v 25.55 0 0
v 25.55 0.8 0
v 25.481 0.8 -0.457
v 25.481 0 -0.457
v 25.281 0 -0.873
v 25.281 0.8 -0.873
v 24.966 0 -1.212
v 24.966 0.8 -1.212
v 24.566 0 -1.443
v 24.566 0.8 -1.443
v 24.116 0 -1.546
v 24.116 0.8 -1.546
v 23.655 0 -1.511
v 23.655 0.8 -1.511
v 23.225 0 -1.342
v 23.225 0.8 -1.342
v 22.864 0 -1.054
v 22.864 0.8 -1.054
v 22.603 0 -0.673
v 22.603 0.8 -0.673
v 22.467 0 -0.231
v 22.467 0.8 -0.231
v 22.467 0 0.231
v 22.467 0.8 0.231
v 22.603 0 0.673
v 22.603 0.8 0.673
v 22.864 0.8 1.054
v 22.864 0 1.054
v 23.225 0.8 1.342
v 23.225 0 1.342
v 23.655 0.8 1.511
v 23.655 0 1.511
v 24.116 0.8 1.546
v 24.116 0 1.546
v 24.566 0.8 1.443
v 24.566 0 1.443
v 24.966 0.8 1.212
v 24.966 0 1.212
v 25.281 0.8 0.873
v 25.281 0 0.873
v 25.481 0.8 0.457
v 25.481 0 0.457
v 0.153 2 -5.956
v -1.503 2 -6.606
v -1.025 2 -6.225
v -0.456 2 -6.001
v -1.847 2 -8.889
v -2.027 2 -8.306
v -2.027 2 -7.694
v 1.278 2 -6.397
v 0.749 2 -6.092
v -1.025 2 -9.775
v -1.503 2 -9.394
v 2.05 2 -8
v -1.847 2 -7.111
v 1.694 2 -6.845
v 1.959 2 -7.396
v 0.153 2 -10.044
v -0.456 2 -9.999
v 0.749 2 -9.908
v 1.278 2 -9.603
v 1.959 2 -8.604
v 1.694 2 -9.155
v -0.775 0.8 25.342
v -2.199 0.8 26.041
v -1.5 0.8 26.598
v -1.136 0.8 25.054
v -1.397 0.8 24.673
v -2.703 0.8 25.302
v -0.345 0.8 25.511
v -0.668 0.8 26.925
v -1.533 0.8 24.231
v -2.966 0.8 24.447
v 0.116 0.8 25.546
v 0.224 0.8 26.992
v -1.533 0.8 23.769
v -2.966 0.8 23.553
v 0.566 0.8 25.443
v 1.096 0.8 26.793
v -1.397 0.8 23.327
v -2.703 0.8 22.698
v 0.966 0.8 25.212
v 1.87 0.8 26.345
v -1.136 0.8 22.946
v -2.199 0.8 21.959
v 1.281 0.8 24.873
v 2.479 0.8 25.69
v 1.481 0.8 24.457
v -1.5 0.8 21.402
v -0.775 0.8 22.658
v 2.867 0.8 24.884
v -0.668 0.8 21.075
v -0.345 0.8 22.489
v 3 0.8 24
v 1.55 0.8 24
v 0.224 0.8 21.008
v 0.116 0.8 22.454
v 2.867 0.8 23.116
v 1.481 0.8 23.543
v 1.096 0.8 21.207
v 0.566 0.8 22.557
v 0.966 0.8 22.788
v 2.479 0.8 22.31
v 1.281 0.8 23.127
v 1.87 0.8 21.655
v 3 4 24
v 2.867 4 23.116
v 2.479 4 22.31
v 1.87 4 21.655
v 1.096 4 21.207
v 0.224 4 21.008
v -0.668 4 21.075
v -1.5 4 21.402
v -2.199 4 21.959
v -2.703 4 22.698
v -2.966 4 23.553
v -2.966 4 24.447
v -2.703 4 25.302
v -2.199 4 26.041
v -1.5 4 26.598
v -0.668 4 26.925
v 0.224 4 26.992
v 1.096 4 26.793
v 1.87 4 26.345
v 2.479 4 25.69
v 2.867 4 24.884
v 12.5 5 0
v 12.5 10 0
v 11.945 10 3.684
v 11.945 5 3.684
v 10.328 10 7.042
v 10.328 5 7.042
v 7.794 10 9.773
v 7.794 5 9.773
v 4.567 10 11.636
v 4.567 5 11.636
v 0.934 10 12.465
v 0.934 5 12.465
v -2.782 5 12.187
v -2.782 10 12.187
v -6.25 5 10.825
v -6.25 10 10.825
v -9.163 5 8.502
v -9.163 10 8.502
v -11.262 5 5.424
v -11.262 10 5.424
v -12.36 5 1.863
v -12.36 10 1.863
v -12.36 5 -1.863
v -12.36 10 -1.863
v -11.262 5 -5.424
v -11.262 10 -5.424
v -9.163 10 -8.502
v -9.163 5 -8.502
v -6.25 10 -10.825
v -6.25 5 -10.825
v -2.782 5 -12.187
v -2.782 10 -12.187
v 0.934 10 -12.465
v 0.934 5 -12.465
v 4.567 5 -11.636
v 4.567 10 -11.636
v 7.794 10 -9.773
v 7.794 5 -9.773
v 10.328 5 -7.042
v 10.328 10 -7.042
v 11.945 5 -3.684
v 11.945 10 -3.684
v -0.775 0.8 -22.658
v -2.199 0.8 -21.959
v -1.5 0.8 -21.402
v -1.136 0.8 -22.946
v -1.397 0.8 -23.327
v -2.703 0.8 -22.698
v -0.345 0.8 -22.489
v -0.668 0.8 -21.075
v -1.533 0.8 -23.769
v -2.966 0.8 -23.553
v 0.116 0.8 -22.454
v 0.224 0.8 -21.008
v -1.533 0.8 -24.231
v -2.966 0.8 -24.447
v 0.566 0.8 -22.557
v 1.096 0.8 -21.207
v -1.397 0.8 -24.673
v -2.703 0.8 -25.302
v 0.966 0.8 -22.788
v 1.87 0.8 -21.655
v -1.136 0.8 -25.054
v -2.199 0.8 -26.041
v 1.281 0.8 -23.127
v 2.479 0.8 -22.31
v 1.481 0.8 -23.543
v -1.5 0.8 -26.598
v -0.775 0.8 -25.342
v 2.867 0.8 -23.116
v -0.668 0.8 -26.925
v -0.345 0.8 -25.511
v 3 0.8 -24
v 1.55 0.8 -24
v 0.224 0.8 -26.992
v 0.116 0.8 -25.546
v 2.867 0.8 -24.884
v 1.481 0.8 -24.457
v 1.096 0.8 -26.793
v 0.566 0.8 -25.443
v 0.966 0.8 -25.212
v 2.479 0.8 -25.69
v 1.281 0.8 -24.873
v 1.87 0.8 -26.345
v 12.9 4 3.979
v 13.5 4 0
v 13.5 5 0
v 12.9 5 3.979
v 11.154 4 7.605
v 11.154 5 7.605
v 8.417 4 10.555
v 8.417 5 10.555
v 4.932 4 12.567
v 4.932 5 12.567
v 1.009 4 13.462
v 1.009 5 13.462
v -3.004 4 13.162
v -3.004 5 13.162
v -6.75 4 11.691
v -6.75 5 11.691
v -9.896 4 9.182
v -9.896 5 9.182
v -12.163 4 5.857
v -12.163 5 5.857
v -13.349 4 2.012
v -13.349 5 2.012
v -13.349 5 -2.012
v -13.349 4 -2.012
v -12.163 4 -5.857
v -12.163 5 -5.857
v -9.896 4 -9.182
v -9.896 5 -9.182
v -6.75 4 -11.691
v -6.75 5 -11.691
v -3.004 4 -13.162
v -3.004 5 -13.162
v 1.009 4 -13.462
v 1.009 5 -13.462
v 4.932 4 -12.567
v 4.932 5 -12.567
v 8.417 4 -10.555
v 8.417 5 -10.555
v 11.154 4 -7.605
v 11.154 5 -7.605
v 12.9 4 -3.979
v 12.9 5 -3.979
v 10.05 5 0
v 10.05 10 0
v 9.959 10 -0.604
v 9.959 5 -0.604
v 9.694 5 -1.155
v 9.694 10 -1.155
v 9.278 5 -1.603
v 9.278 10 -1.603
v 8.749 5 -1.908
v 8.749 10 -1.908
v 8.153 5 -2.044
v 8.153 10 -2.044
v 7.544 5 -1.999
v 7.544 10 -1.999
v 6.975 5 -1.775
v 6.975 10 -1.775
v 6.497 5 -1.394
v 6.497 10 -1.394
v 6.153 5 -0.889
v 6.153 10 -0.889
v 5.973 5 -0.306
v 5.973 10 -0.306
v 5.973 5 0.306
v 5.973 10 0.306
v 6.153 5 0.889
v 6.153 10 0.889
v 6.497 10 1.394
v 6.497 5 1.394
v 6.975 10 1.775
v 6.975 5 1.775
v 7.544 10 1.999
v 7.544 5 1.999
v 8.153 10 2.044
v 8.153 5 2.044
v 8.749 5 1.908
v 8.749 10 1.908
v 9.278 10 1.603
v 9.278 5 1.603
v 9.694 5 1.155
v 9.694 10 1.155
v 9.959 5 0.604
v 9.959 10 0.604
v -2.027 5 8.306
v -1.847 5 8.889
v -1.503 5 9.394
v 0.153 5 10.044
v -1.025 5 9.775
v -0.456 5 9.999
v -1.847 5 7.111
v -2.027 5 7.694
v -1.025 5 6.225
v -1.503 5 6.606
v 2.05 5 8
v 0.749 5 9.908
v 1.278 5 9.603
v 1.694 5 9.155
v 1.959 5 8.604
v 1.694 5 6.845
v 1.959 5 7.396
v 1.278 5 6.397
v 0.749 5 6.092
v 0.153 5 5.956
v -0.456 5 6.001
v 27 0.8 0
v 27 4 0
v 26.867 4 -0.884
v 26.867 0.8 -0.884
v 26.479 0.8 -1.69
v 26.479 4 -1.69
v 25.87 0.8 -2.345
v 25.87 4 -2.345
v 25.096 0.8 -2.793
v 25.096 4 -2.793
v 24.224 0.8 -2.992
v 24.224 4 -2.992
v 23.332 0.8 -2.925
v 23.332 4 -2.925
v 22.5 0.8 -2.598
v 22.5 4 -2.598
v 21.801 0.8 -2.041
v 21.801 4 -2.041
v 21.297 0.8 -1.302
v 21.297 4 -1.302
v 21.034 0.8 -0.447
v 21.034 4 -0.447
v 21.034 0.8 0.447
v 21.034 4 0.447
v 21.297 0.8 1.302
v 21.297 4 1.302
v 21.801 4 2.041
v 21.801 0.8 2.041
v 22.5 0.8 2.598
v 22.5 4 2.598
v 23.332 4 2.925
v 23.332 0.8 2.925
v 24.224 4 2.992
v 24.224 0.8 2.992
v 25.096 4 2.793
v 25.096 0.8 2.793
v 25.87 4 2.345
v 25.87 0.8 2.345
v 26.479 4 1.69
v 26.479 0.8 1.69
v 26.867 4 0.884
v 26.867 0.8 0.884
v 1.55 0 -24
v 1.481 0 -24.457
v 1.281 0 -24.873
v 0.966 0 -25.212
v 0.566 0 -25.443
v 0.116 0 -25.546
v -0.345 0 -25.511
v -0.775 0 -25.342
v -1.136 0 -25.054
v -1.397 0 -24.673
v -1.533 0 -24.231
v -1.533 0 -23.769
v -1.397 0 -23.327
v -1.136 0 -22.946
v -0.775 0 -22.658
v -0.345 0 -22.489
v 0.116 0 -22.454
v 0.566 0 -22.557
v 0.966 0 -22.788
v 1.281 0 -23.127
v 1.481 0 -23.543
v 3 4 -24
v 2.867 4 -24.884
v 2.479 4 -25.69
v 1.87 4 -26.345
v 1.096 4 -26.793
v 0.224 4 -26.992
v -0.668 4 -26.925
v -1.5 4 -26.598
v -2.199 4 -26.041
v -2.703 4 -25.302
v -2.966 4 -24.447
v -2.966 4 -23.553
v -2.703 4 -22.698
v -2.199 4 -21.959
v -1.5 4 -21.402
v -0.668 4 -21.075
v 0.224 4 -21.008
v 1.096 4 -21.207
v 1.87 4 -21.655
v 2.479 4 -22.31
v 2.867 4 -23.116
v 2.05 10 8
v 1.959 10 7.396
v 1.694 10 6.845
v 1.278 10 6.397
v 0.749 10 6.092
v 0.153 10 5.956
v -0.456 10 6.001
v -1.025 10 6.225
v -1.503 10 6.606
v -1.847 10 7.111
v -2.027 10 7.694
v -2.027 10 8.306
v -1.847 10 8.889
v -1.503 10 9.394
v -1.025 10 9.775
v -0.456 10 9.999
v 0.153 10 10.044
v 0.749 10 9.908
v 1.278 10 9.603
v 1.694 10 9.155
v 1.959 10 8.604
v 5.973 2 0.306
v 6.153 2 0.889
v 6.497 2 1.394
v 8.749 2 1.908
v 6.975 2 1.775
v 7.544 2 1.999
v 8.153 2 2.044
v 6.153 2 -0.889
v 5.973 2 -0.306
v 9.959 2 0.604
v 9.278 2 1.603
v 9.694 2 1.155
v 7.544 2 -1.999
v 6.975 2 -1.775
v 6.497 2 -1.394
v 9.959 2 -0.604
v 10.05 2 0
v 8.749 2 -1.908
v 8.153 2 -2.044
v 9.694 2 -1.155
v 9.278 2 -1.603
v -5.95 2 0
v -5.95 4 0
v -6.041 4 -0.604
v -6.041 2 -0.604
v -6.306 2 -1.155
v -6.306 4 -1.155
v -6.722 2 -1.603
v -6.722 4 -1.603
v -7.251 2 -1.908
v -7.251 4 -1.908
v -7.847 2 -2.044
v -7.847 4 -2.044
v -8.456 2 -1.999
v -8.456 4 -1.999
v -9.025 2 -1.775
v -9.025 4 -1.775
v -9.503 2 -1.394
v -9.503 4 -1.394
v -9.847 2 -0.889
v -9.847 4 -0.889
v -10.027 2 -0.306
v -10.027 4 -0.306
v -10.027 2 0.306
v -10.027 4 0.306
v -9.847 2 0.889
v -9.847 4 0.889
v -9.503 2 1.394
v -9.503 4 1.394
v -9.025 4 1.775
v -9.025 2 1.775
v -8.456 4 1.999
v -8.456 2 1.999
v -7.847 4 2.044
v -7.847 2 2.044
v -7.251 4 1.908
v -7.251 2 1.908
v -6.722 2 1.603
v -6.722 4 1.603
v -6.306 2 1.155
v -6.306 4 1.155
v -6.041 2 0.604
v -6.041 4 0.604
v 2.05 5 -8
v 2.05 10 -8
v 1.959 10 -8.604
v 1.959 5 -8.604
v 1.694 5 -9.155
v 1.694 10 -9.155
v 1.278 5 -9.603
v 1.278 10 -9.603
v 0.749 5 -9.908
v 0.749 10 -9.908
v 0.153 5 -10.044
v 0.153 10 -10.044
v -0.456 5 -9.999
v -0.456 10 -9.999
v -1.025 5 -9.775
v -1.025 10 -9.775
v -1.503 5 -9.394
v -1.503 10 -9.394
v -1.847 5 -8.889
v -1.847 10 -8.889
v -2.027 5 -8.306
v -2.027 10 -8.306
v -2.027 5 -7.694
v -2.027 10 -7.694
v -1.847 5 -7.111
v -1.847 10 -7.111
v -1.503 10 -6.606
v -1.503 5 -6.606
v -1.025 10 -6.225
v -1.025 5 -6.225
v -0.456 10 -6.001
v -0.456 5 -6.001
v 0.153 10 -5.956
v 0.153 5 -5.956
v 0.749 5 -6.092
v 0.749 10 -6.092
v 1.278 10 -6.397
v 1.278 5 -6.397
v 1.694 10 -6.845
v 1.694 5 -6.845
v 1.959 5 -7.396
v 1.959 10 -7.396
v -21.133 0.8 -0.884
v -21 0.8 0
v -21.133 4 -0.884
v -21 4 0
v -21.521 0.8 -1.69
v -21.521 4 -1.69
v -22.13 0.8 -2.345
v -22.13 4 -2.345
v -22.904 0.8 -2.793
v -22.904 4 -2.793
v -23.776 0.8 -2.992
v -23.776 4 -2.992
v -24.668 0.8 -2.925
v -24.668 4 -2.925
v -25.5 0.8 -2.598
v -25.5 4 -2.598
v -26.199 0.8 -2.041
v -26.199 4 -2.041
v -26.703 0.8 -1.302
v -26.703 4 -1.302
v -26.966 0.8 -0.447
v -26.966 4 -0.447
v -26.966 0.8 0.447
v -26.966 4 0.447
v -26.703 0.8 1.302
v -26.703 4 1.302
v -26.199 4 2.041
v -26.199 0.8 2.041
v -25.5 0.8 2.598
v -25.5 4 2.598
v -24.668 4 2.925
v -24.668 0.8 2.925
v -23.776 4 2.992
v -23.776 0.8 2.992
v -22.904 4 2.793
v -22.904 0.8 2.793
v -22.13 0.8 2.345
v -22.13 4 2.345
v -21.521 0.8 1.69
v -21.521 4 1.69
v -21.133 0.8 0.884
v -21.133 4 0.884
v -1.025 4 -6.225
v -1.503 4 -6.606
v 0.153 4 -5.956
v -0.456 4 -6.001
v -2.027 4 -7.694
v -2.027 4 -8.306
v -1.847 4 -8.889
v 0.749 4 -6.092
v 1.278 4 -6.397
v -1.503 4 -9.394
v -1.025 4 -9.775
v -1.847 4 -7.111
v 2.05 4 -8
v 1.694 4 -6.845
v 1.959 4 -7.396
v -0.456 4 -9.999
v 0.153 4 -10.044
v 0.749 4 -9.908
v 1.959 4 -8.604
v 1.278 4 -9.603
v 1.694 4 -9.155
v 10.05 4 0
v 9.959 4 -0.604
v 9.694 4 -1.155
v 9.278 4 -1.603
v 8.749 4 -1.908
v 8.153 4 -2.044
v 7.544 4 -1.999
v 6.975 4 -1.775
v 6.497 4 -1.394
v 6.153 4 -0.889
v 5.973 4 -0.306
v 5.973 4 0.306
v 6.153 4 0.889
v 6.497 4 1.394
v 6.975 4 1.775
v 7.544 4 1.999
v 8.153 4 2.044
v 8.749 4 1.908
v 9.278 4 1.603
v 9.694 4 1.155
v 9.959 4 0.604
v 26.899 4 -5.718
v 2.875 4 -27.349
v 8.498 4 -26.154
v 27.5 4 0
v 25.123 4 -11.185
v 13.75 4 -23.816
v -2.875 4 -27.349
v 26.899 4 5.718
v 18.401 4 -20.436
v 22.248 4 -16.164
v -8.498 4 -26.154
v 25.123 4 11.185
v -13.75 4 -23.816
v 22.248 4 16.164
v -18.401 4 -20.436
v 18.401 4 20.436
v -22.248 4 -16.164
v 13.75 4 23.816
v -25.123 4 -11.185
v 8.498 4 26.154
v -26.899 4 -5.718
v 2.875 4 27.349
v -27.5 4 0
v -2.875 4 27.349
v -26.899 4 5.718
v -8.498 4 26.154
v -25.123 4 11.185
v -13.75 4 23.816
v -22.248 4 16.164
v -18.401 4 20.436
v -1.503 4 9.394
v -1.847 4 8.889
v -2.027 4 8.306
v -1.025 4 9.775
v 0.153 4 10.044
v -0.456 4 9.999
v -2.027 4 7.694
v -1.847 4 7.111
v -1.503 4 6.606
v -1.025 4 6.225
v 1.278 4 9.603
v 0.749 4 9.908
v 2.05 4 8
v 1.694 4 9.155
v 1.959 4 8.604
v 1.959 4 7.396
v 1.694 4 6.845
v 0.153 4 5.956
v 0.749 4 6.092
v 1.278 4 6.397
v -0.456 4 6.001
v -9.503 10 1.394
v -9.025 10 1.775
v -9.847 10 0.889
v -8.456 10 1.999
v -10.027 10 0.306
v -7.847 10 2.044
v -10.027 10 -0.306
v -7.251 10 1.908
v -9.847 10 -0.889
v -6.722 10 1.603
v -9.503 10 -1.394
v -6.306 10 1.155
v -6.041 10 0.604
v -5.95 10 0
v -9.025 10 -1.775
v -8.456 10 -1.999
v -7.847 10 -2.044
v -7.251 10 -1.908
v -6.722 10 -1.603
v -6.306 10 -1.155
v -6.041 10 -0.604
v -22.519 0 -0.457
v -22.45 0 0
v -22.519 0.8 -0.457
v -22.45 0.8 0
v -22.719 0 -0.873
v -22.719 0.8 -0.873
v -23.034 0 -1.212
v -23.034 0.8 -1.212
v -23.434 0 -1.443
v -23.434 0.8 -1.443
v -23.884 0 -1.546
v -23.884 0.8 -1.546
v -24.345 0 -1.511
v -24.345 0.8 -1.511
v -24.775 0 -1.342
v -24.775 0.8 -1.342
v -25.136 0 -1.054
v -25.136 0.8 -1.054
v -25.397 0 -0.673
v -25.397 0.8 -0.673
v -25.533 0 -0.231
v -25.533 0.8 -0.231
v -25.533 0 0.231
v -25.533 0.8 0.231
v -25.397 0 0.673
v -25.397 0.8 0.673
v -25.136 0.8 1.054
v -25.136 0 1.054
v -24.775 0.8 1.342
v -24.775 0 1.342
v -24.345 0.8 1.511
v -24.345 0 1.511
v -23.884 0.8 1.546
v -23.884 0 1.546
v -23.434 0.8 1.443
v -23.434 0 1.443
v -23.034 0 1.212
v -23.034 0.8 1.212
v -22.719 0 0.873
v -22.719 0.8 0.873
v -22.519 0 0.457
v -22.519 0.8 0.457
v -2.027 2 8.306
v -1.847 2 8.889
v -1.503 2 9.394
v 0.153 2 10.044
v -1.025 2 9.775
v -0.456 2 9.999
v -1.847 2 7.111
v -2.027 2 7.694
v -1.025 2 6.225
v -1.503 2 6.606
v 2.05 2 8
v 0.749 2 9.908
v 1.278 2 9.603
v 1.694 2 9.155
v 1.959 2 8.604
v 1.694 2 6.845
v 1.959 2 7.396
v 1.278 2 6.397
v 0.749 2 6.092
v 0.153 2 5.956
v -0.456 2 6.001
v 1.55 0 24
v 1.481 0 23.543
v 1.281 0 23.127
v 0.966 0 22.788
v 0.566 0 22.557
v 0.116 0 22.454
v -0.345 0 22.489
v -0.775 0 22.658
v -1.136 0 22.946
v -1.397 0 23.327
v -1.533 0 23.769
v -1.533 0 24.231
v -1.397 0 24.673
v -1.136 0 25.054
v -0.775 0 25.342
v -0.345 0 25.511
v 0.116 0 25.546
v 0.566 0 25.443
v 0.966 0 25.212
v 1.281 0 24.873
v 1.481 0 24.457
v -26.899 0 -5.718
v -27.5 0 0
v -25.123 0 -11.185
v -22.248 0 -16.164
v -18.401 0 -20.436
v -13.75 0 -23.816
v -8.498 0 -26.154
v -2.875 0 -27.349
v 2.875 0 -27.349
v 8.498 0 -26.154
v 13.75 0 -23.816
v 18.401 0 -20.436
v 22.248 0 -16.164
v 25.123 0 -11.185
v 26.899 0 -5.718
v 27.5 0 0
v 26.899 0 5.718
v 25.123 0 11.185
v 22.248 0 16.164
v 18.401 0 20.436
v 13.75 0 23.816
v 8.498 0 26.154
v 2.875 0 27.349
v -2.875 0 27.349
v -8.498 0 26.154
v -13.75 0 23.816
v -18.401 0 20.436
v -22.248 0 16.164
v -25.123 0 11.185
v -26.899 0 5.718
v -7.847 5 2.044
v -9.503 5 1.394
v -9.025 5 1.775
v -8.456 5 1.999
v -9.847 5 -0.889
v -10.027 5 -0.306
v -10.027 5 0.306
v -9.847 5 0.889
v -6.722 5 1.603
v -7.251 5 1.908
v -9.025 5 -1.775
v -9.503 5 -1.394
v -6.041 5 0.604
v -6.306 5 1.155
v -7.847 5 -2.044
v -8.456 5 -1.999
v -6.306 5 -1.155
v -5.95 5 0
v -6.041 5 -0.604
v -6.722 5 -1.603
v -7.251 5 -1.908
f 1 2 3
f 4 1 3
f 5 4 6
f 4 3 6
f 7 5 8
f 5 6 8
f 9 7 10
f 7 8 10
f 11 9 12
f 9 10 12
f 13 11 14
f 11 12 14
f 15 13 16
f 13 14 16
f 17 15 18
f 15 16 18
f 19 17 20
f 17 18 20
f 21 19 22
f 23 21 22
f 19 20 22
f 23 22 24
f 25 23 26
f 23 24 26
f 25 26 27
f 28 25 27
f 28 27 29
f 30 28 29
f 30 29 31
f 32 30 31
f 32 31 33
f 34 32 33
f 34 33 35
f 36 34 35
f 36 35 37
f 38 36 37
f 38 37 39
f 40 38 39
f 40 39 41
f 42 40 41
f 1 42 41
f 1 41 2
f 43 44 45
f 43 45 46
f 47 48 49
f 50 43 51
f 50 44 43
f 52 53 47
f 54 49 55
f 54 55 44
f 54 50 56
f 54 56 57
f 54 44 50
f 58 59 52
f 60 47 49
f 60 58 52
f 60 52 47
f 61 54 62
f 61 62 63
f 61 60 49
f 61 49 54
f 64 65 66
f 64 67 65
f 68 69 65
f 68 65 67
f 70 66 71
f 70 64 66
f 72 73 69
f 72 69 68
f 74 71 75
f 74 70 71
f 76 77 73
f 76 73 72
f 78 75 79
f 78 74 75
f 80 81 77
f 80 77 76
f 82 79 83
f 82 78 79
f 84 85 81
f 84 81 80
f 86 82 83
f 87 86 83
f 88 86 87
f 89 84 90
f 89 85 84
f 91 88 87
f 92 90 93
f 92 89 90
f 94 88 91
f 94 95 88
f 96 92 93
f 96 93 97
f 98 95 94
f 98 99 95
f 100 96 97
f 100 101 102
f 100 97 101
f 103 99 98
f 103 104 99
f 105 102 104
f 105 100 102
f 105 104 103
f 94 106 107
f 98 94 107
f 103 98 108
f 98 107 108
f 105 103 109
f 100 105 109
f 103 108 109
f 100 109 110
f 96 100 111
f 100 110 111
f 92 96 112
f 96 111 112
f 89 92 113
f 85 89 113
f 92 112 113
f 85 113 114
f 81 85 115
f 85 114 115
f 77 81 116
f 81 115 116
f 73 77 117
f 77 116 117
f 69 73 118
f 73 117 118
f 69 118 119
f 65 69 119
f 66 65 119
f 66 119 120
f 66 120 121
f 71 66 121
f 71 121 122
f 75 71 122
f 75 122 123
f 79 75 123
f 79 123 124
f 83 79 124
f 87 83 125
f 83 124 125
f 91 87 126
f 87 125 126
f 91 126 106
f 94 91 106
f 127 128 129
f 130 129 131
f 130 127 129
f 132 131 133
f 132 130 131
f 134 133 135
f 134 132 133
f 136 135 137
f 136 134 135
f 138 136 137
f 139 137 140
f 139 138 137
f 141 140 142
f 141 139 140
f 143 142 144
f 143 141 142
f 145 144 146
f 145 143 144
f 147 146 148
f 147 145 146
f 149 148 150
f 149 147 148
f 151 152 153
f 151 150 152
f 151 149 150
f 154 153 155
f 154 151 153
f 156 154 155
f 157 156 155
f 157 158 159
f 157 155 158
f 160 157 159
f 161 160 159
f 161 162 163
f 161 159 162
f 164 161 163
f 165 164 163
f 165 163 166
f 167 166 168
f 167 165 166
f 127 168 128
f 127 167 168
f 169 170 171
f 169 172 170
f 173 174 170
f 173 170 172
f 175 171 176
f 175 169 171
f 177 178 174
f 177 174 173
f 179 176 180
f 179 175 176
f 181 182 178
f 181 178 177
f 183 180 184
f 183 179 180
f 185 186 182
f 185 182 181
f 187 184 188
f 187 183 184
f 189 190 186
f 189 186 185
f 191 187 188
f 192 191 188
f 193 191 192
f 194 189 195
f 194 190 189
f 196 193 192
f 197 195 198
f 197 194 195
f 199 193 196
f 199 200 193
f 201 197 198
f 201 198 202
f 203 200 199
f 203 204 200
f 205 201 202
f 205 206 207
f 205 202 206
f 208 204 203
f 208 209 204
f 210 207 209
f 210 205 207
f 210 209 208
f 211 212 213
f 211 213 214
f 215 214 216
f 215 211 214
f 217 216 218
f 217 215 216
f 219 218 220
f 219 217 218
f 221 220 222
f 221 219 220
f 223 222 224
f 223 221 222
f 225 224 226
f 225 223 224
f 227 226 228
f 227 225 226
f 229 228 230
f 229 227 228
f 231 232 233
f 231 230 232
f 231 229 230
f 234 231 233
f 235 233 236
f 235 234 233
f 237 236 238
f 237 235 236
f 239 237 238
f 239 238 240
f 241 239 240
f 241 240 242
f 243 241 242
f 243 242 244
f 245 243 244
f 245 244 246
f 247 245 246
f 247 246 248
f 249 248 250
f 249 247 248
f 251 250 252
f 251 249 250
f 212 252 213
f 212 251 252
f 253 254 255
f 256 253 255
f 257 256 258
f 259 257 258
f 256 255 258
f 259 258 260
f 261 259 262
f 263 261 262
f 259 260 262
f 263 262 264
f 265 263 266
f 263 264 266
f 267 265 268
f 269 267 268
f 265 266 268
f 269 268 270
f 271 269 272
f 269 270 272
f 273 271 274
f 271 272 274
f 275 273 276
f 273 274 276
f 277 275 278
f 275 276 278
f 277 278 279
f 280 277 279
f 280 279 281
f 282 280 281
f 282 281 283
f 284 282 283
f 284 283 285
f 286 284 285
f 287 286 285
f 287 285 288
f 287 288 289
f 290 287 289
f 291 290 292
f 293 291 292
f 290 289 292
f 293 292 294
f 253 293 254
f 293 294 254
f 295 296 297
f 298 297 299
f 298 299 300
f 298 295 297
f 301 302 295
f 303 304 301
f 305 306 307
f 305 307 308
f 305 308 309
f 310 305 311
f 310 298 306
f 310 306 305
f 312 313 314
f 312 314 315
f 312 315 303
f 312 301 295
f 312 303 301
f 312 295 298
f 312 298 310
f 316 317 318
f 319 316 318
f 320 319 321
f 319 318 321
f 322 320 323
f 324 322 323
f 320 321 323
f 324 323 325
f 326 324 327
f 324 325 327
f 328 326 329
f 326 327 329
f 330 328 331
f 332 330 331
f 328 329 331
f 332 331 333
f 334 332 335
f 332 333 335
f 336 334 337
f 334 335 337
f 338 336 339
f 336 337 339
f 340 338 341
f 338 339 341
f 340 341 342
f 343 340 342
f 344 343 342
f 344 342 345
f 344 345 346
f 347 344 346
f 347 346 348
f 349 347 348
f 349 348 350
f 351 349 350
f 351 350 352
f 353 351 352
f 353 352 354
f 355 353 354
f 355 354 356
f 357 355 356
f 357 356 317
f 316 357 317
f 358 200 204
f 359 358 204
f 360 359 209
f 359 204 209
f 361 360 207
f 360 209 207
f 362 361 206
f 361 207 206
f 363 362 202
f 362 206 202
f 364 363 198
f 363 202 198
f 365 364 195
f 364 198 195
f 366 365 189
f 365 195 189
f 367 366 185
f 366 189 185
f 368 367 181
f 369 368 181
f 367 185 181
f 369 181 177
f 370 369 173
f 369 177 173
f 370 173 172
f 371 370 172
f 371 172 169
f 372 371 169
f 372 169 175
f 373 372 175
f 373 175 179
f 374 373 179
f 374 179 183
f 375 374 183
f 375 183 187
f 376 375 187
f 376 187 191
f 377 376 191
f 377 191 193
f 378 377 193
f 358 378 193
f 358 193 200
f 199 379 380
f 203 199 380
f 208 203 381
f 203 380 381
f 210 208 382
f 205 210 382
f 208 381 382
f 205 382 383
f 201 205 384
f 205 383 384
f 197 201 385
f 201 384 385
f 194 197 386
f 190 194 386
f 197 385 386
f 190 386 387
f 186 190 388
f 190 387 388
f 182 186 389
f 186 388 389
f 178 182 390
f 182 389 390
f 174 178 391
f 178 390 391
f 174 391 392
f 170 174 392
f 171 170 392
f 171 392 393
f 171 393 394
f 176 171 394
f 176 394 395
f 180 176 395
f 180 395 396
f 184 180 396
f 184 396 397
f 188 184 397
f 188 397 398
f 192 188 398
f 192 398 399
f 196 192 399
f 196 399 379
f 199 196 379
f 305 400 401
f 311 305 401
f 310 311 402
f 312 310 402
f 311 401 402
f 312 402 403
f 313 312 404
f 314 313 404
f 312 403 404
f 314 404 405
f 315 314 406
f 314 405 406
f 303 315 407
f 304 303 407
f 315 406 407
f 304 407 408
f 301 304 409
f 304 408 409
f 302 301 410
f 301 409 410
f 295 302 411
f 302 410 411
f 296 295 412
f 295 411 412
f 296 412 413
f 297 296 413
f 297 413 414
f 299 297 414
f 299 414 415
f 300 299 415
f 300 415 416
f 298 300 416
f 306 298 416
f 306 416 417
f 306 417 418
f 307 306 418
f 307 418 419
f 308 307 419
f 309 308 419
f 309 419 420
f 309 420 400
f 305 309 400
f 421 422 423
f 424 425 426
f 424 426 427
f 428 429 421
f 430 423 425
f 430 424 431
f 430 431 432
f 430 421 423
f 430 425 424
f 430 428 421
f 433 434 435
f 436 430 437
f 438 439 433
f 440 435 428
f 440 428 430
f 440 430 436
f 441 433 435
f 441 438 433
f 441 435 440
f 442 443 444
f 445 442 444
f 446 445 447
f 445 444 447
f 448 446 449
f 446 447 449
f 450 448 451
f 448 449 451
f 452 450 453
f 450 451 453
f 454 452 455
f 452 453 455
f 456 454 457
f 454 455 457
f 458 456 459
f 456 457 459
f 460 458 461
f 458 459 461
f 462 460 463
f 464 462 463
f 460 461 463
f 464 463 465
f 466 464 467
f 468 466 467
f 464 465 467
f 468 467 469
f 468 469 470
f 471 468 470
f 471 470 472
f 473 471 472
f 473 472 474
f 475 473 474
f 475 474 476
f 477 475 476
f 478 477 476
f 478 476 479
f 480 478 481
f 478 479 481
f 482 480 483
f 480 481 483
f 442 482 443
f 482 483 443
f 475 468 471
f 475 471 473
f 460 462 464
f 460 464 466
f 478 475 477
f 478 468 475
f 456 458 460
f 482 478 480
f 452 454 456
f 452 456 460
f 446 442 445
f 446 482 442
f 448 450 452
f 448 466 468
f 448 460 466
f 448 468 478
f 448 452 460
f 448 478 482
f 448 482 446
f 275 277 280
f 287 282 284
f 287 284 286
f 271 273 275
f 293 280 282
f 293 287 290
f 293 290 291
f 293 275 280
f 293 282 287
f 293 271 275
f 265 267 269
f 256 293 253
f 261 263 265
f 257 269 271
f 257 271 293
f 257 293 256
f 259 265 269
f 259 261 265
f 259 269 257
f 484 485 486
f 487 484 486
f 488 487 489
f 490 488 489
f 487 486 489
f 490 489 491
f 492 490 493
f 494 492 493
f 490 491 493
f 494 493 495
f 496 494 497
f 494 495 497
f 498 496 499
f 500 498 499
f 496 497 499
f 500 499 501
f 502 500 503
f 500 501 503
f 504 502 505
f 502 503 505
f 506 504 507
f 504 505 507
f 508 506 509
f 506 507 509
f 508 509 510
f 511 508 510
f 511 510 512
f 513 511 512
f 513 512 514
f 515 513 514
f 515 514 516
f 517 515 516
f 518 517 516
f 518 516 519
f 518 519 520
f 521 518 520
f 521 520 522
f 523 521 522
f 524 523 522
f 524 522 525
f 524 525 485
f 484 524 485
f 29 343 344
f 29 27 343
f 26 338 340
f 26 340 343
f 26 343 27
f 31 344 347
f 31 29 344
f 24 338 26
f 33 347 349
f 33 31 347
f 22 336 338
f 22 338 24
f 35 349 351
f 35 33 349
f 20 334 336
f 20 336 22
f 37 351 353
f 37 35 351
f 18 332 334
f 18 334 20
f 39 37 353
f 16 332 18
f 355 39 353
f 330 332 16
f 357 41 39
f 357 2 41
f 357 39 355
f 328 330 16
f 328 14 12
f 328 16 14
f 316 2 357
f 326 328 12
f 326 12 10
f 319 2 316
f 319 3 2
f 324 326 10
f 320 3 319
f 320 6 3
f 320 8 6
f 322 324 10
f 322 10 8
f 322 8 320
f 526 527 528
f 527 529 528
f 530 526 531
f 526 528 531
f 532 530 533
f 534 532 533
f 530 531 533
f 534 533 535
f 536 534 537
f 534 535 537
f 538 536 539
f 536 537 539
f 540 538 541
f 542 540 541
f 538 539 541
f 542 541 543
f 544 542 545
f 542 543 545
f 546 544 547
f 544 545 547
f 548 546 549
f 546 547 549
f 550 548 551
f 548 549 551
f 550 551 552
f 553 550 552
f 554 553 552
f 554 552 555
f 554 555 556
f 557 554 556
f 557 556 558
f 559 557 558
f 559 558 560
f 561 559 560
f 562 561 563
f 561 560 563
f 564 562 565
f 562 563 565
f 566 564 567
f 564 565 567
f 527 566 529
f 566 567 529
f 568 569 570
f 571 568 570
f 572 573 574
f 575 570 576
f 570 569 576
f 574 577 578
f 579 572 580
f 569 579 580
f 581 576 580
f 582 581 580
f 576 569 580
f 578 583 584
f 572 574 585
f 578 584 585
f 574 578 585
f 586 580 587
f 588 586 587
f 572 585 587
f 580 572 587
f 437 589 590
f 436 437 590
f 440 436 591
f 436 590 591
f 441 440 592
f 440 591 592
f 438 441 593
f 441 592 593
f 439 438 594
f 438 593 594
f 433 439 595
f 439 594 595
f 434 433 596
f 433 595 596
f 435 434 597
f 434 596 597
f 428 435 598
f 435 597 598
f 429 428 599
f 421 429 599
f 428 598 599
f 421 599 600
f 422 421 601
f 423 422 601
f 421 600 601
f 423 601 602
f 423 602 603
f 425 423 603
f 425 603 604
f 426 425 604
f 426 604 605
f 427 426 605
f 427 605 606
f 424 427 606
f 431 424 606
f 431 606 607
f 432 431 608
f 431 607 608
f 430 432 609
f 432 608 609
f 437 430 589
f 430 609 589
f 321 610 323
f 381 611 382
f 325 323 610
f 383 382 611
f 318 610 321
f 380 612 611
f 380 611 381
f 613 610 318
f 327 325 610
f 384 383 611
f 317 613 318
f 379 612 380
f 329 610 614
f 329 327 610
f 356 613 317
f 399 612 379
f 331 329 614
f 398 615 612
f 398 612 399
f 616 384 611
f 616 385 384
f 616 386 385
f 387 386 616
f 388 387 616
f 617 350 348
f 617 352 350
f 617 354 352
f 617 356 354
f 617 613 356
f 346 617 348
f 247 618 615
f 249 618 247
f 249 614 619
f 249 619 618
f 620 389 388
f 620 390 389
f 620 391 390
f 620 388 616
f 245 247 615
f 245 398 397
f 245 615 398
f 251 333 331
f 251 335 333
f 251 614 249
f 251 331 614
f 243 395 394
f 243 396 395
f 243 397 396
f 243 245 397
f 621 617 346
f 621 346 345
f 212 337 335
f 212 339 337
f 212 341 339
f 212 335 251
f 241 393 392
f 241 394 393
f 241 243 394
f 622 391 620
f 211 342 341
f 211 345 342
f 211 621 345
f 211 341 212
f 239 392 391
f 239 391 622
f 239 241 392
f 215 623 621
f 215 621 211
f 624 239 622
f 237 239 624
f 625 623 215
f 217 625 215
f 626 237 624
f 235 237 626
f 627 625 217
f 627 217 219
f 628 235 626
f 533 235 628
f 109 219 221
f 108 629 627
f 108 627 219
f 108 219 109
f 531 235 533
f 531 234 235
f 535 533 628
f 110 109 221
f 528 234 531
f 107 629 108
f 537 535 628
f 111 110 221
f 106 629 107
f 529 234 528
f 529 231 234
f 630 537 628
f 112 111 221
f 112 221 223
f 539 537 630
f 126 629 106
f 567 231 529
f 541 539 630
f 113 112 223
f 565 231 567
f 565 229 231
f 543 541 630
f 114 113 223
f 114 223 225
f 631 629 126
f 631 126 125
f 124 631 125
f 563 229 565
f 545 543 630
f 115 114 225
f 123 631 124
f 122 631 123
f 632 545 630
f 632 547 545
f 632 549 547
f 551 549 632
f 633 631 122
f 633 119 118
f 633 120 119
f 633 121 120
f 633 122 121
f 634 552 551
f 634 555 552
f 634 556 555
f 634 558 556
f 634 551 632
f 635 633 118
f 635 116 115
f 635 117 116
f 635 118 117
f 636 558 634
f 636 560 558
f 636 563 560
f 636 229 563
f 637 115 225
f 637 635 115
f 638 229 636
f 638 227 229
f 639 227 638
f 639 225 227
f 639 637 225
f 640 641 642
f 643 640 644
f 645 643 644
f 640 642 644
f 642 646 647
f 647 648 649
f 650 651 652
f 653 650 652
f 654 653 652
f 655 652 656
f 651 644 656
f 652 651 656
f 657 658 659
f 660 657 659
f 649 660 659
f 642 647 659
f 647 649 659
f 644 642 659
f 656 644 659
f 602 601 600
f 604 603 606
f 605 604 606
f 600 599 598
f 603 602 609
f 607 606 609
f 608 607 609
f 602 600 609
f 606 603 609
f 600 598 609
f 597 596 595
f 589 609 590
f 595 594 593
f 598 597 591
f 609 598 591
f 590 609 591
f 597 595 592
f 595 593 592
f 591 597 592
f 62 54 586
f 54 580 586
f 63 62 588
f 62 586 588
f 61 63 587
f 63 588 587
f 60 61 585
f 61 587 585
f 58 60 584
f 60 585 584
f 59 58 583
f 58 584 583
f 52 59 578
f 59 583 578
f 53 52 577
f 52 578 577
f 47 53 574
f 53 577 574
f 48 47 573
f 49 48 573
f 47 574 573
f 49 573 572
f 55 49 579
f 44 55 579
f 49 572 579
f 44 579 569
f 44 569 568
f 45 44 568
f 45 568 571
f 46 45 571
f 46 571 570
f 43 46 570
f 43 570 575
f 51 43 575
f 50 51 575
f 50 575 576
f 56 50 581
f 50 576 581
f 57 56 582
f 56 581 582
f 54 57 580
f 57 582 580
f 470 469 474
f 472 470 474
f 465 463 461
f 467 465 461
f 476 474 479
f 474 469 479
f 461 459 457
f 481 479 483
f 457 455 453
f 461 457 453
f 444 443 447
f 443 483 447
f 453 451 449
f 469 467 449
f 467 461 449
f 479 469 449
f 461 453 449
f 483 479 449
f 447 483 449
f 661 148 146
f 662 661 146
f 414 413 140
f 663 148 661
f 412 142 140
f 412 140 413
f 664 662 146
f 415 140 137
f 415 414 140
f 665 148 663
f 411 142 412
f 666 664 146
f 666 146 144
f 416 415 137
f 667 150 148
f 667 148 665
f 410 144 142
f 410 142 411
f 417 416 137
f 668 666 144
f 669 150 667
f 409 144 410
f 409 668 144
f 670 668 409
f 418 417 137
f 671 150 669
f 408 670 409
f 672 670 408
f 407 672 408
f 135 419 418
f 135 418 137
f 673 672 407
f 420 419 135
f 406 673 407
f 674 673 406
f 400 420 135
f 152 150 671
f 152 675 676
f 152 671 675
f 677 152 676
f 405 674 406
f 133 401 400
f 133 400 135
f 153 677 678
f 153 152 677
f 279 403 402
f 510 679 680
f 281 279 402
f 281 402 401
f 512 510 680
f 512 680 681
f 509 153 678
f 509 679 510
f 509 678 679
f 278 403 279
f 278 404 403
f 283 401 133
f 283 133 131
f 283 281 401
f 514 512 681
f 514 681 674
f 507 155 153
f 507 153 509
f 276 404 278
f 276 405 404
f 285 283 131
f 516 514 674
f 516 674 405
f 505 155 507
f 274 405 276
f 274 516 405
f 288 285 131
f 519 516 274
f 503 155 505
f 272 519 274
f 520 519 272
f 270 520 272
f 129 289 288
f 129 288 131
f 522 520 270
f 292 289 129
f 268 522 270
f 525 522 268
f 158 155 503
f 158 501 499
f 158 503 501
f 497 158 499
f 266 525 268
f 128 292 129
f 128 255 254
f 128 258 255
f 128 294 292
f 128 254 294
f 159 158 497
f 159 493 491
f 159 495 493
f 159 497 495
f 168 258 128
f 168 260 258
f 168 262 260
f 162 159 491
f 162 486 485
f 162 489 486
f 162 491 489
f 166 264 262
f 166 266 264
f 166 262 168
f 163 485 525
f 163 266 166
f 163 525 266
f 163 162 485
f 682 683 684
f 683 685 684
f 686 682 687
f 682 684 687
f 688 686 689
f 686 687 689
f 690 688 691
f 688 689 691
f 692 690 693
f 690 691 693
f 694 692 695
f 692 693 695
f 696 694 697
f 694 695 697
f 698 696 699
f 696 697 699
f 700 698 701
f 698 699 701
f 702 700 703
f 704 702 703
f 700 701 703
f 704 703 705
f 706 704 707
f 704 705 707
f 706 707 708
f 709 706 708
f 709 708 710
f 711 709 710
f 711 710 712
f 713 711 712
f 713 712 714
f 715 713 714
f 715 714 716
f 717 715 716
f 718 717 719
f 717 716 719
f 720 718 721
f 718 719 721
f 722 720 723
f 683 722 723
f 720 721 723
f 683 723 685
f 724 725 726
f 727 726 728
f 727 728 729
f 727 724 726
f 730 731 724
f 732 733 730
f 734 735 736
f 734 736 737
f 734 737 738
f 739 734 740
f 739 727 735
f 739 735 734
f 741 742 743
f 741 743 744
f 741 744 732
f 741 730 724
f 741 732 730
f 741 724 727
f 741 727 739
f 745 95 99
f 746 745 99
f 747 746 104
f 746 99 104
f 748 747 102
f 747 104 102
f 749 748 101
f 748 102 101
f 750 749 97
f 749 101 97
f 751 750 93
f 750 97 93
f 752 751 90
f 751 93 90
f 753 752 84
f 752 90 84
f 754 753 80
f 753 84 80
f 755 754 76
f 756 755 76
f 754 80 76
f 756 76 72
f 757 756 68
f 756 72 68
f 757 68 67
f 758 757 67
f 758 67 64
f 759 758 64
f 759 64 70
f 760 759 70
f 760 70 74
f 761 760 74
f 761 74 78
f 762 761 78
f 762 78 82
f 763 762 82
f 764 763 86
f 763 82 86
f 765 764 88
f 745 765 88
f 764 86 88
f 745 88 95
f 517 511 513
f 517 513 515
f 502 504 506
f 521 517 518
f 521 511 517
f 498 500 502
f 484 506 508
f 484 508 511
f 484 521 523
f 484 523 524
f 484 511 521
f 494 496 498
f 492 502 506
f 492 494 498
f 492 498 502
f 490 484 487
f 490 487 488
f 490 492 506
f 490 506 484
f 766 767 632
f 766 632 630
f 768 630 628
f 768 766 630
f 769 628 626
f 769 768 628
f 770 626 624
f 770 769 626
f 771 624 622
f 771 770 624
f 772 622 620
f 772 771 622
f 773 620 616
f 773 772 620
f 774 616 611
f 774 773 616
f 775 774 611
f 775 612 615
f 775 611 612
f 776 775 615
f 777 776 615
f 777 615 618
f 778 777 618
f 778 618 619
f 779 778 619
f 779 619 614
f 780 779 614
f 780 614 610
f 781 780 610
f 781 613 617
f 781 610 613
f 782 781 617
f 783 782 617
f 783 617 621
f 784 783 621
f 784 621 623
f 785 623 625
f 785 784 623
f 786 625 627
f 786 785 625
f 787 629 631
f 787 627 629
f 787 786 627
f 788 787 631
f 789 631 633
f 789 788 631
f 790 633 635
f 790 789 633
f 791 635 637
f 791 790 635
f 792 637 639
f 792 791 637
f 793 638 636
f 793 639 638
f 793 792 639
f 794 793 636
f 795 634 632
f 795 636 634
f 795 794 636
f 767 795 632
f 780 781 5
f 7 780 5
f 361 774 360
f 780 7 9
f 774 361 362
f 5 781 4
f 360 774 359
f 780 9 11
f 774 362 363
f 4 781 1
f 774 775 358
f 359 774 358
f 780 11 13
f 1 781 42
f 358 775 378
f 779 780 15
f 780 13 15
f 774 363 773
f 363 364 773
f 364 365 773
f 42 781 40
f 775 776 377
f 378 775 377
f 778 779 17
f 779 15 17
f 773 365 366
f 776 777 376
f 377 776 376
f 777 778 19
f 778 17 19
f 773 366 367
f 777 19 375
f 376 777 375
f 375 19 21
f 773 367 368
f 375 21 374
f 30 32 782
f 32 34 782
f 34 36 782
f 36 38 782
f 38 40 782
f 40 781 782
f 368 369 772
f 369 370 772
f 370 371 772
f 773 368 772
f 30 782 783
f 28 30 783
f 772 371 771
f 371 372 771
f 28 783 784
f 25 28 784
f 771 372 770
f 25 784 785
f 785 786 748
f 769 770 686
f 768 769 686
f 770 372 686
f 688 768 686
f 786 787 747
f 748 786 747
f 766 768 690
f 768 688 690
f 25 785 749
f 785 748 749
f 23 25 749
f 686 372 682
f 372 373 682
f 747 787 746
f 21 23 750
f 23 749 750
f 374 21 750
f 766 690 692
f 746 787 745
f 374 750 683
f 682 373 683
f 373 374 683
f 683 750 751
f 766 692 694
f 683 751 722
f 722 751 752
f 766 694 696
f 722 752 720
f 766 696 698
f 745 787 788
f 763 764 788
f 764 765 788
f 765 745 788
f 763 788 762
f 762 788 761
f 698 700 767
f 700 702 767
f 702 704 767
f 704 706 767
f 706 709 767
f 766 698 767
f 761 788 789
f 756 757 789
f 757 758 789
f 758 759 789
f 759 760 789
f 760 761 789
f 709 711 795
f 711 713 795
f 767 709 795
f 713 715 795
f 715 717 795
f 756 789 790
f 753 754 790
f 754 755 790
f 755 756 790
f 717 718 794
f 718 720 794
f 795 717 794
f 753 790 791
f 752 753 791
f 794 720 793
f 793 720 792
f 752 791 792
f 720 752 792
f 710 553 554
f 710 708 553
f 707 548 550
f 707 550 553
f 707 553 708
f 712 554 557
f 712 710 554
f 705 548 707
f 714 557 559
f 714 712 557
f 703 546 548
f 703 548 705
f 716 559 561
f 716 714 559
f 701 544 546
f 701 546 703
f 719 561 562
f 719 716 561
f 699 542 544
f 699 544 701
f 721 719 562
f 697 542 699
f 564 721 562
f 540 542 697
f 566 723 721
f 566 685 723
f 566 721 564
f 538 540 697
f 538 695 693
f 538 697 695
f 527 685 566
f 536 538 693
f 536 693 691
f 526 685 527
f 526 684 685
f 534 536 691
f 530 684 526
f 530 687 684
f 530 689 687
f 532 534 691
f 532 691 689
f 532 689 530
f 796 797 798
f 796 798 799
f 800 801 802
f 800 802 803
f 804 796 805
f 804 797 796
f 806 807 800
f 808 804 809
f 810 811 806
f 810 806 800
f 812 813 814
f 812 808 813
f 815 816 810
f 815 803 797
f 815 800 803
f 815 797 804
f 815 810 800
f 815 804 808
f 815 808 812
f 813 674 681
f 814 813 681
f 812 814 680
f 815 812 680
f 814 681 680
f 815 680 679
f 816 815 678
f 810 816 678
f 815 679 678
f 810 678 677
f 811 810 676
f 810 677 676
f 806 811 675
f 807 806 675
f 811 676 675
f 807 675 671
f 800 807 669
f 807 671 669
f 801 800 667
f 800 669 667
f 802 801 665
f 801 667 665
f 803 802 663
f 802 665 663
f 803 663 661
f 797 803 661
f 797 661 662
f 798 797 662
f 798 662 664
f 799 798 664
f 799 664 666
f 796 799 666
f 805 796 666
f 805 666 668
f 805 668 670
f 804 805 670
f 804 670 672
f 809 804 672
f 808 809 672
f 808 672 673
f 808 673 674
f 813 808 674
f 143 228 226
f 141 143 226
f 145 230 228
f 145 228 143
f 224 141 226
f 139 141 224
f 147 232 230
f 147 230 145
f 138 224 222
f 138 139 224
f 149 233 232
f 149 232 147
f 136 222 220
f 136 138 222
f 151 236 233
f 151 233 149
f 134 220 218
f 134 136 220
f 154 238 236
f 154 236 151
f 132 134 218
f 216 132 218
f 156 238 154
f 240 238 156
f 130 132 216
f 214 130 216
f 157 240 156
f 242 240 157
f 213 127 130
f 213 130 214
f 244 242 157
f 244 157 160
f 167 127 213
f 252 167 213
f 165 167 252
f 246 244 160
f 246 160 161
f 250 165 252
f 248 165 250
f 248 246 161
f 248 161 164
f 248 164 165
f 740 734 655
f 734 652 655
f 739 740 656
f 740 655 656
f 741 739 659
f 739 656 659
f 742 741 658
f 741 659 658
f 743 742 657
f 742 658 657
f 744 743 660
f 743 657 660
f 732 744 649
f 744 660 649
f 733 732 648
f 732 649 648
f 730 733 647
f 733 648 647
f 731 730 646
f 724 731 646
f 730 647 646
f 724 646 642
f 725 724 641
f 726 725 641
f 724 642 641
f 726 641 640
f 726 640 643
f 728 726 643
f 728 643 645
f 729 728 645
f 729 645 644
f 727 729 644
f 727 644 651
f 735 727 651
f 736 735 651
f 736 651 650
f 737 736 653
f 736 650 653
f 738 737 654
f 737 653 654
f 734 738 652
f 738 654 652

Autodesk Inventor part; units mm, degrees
ref_plane "YZ Plane" through (0, 0, 0) normal (1, 0, 0) x (0, 1, 0)
ref_plane "XZ Plane" through (0, 0, 0) normal (0, 1, 0) x (-1, 0, 0)
ref_plane "XY Plane" through (0, 0, 0) normal (0, 0, 1) x (1, 0, 0)
sketch "Szkic1" plane through (0, 0, 0) normal (0, 1, 0) x (-1, 0, 0)
  circle A0 centre (0, 0) radius 27.5
  dimension "d0" = 55
extrude "Wyciągnięcie proste1" add sketch "Szkic1" along normal blind 4
sketch "Szkic2" plane through (0, 4, 0) normal (0, 1, 0) x (1, 0, 0)
  circle A0 centre (-24, 0) radius 1.55
  circle A1 centre (0, -24) radius 1.55
  circle A2 centre (24, 0) radius 1.55
  circle A3 centre (0, 24) radius 1.55
  point P0 (0, 0)
  dimension "d3" = 3.1
  dimension "d4" = 24
  dimension "d7" = 360
extrude "Wyciągnięcie proste2" cut sketch "Szkic2" against normal up to surface (4 mm away)
sketch "Szkic3" plane through (0, 4, 0) normal (0, 1, 0) x (1, 0, 0)
  circle A0 centre (0, 0) radius 12.5
  dimension "d11" = 25
extrude "Wyciągnięcie proste3" add sketch "Szkic3" along normal blind 6
sketch "Szkic4" plane through (0, 10, 0) normal (0, 1, 0) x (1, 0, 0)
  circle A0 centre (-8, 0) radius 2.05
  circle A1 centre (0, -8) radius 2.05
  circle A2 centre (8, 0) radius 2.05
  circle A3 centre (0, 8) radius 2.05
  point P0 (0, 0)
  dimension "d14" = 4.1
  dimension "d17" = 360
  dimension "d19" = 8
extrude "Wyciągnięcie proste4" cut sketch "Szkic4" against normal blind 8
sketch "Szkic5" plane through (0, 4, 0) normal (0, 1, 0) x (1, 0, 0)
  circle A0 centre (-24, 0) radius 1.55 projected
  circle A1 centre (-24, 0) radius 3
  circle A2 centre (0, -24) radius 3
  circle A3 centre (24, 0) radius 3
  circle A4 centre (0, 24) radius 3
  point P0 (0, 0)
  dimension "d22" = 6
  dimension "d27" = 360
extrude "Wyciągnięcie proste5" cut sketch "Szkic5" against normal blind 3.2
sketch "Szkic6" plane through (0, 4, 0) normal (0, 1, 0) x (1, 0, 0)
  circle A0 centre (0, 0) radius 13.5
  dimension "d29" = 27
extrude "Wyciągnięcie proste6" add sketch "Szkic6" along normal blind 1
properties part number "_Drukowanie 3D"
